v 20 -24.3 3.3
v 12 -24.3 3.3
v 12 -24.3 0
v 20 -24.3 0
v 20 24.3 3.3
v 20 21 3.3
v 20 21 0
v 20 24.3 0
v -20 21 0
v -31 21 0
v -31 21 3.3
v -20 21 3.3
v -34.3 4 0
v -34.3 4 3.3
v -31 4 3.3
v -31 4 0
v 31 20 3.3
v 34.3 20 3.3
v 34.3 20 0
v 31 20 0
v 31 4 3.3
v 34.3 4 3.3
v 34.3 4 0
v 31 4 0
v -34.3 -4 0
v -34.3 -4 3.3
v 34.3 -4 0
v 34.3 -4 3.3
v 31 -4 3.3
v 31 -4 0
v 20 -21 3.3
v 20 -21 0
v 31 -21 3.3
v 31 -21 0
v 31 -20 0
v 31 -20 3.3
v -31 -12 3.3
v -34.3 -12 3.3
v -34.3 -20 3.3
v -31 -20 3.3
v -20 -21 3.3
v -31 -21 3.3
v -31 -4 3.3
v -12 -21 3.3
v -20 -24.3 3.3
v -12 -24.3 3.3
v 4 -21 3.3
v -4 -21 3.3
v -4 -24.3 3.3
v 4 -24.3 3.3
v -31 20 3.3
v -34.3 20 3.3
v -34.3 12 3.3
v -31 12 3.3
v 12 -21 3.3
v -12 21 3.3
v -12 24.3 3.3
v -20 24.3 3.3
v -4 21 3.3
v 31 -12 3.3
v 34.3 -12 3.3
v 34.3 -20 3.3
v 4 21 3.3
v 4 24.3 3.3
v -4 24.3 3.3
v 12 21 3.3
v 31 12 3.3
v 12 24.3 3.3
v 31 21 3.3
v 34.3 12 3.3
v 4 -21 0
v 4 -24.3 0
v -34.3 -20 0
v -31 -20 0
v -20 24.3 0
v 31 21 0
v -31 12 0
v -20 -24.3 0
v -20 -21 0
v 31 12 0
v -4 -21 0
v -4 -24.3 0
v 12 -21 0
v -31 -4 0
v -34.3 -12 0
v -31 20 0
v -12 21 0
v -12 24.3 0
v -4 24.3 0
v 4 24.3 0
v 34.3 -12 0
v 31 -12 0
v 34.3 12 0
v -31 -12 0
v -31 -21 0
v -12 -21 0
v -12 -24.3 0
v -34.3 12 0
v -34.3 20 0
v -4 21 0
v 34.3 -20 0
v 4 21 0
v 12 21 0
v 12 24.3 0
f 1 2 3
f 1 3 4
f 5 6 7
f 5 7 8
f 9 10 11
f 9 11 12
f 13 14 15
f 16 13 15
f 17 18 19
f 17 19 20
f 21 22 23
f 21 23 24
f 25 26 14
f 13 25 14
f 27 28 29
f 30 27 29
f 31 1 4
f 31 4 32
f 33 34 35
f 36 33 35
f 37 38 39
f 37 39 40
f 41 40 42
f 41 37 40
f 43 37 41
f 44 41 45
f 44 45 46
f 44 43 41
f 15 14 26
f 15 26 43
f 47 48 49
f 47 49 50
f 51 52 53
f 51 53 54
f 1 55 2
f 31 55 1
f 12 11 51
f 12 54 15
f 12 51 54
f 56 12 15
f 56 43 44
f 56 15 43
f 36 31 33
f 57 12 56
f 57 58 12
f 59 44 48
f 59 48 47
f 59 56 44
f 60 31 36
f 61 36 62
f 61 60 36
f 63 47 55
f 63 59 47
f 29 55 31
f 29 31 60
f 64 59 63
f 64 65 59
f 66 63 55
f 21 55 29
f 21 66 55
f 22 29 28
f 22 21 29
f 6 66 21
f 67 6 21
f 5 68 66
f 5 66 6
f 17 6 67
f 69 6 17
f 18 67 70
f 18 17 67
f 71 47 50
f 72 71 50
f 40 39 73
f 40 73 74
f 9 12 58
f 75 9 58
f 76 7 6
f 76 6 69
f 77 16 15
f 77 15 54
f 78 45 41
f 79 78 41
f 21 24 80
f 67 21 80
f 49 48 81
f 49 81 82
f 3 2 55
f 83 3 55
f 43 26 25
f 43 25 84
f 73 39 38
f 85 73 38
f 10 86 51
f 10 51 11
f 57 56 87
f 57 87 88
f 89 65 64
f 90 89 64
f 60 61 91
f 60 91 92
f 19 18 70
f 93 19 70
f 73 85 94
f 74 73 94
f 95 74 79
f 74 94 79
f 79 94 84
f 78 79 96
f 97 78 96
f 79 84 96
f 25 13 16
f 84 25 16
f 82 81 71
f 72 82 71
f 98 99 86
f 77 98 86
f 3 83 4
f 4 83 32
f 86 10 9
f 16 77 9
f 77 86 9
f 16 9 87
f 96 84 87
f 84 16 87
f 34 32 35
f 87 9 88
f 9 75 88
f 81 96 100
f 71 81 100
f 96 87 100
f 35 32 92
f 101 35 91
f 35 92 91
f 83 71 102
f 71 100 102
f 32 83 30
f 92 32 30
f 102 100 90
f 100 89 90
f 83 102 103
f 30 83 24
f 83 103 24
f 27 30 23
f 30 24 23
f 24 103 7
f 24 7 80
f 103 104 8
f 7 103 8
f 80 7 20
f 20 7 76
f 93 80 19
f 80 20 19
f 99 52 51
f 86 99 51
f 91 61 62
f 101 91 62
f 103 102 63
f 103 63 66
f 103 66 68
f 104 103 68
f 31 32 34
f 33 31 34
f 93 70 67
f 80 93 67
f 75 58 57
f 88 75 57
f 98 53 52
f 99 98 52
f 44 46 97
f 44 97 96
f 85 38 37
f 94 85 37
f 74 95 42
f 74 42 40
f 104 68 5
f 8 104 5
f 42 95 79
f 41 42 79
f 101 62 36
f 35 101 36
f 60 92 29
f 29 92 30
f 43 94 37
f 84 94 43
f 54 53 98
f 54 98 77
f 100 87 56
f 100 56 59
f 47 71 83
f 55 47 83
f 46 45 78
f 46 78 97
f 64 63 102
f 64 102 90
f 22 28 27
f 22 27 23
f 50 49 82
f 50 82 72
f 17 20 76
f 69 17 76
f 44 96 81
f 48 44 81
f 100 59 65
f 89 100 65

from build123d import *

# Parameters (mm, degrees)
ESQUISSE1_W                    = 62
ESQUISSE1_H                    = 42
BOSS_EXTRU_1_DEPTH             = 3.3
ESQUISSE2_W                    = 8
ESQUISSE2_H                    = 3.3
BOSS_EXTRU_2_DEPTH             = 3.3
R_P_TITION_LIN_AIRE1_COUNT     = 2
R_P_TITION_LIN_AIRE1_PITCH     = 16
R_P_TITION_LIN_AIRE1_COL_COUNT = 2
R_P_TITION_LIN_AIRE1_COL_PITCH = 16
SYM_TRIE1_COPY_1_SKETCH_W      = 8
SYM_TRIE1_COPY_1_SKETCH_H      = 3.3
SYM_TRIE1_COPY_1_DEPTH         = 3.3
SYM_TRIE1_COPY_2_SKETCH_W      = 8
SYM_TRIE1_COPY_2_SKETCH_H      = 3.3
SYM_TRIE1_COPY_2_DEPTH         = 3.3
ESQUISSE3_W                    = 3.3
ESQUISSE3_H                    = 8
BOSS_EXTRU_3_DEPTH             = 3.3
R_P_TITION_LIN_AIRE2_COUNT     = 2
R_P_TITION_LIN_AIRE2_PITCH     = 16
R_P_TITION_LIN_AIRE2_COL_COUNT = 2
R_P_TITION_LIN_AIRE2_COL_PITCH = 16
SYM_TRIE2_COPY_1_SKETCH_W      = 3.3
SYM_TRIE2_COPY_1_SKETCH_H      = 8
SYM_TRIE2_COPY_1_DEPTH         = 3.3
SYM_TRIE2_COPY_2_SKETCH_W      = 3.3
SYM_TRIE2_COPY_2_SKETCH_H      = 8
SYM_TRIE2_COPY_2_DEPTH         = 3.3


with BuildPart() as part:
    # Esquisse1 → Boss.-Extru.1 (new body)
    with BuildSketch(Plane.XY):
        Rectangle(ESQUISSE1_W, ESQUISSE1_H)
    extrude(amount=BOSS_EXTRU_1_DEPTH)

    # Esquisse2 → Boss.-Extru.2 (add)
    with BuildSketch(Plane.XY.offset(3.3)):
        with Locations((0, 22.65)):
            Rectangle(ESQUISSE2_W, ESQUISSE2_H)
    boss_extru_2 = extrude(amount=-BOSS_EXTRU_2_DEPTH)

    # Répétition linéaire1: Boss.-Extru.2 ×2
    with Locations(*[(-i * R_P_TITION_LIN_AIRE1_PITCH, 0, 0) for i in range(1, R_P_TITION_LIN_AIRE1_COUNT)]):
        add(boss_extru_2)

    # Répétition linéaire1 col: Boss.-Extru.2 ×2
    with Locations(*[(i * R_P_TITION_LIN_AIRE1_COL_PITCH, 0, 0) for i in range(1, R_P_TITION_LIN_AIRE1_COL_COUNT)]):
        add(boss_extru_2)

    # Symétrie1: Boss.-Extru.2 across plane
    add(boss_extru_2.mirror(Plane.ZX))

    # Symétrie1 copy 1 sketch → Symétrie1 copy 1 (add)
    with BuildSketch(Plane(origin=(-16, 0, 3.3), x_dir=(1, 0, 0), z_dir=(0, 0, 1))):
        with Locations((0, -22.65)):
            Rectangle(SYM_TRIE1_COPY_1_SKETCH_W, SYM_TRIE1_COPY_1_SKETCH_H)
    extrude(amount=-SYM_TRIE1_COPY_1_DEPTH)

    # Symétrie1 copy 2 sketch → Symétrie1 copy 2 (add)
    with BuildSketch(Plane(origin=(16, 0, 3.3), x_dir=(1, 0, 0), z_dir=(0, 0, 1))):
        with Locations((0, -22.65)):
            Rectangle(SYM_TRIE1_COPY_2_SKETCH_W, SYM_TRIE1_COPY_2_SKETCH_H)
    extrude(amount=-SYM_TRIE1_COPY_2_DEPTH)

    # Esquisse3 → Boss.-Extru.3 (add)
    with BuildSketch(Plane.XY.offset(3.3)):
        with Locations((-32.65, 0)):
            Rectangle(ESQUISSE3_W, ESQUISSE3_H)
    boss_extru_3 = extrude(amount=-BOSS_EXTRU_3_DEPTH)

    # Répétition linéaire2: Boss.-Extru.3 ×2
    with Locations(*[(0, i * R_P_TITION_LIN_AIRE2_PITCH, 0) for i in range(1, R_P_TITION_LIN_AIRE2_COUNT)]):
        add(boss_extru_3)

    # Répétition linéaire2 col: Boss.-Extru.3 ×2
    with Locations(*[(0, -i * R_P_TITION_LIN_AIRE2_COL_PITCH, 0) for i in range(1, R_P_TITION_LIN_AIRE2_COL_COUNT)]):
        add(boss_extru_3)

    # Symétrie2: Boss.-Extru.3 across plane
    add(boss_extru_3.mirror(Plane(origin=(0, 0, 0), x_dir=(0, 0, 1), z_dir=(1, 0, 0))))

    # Symétrie2 copy 1 sketch → Symétrie2 copy 1 (add)
    with BuildSketch(Plane(origin=(0, 16, 3.3), x_dir=(-1, 0, 0), z_dir=(0, 0, 1))):
        with Locations((-32.65, 0)):
            Rectangle(SYM_TRIE2_COPY_1_SKETCH_W, SYM_TRIE2_COPY_1_SKETCH_H)
    extrude(amount=-SYM_TRIE2_COPY_1_DEPTH)

    # Symétrie2 copy 2 sketch → Symétrie2 copy 2 (add)
    with BuildSketch(Plane(origin=(0, -16, 3.3), x_dir=(-1, 0, 0), z_dir=(0, 0, 1))):
        with Locations((-32.65, 0)):
            Rectangle(SYM_TRIE2_COPY_2_SKETCH_W, SYM_TRIE2_COPY_2_SKETCH_H)
    extrude(amount=-SYM_TRIE2_COPY_2_DEPTH)


solid = part.part
